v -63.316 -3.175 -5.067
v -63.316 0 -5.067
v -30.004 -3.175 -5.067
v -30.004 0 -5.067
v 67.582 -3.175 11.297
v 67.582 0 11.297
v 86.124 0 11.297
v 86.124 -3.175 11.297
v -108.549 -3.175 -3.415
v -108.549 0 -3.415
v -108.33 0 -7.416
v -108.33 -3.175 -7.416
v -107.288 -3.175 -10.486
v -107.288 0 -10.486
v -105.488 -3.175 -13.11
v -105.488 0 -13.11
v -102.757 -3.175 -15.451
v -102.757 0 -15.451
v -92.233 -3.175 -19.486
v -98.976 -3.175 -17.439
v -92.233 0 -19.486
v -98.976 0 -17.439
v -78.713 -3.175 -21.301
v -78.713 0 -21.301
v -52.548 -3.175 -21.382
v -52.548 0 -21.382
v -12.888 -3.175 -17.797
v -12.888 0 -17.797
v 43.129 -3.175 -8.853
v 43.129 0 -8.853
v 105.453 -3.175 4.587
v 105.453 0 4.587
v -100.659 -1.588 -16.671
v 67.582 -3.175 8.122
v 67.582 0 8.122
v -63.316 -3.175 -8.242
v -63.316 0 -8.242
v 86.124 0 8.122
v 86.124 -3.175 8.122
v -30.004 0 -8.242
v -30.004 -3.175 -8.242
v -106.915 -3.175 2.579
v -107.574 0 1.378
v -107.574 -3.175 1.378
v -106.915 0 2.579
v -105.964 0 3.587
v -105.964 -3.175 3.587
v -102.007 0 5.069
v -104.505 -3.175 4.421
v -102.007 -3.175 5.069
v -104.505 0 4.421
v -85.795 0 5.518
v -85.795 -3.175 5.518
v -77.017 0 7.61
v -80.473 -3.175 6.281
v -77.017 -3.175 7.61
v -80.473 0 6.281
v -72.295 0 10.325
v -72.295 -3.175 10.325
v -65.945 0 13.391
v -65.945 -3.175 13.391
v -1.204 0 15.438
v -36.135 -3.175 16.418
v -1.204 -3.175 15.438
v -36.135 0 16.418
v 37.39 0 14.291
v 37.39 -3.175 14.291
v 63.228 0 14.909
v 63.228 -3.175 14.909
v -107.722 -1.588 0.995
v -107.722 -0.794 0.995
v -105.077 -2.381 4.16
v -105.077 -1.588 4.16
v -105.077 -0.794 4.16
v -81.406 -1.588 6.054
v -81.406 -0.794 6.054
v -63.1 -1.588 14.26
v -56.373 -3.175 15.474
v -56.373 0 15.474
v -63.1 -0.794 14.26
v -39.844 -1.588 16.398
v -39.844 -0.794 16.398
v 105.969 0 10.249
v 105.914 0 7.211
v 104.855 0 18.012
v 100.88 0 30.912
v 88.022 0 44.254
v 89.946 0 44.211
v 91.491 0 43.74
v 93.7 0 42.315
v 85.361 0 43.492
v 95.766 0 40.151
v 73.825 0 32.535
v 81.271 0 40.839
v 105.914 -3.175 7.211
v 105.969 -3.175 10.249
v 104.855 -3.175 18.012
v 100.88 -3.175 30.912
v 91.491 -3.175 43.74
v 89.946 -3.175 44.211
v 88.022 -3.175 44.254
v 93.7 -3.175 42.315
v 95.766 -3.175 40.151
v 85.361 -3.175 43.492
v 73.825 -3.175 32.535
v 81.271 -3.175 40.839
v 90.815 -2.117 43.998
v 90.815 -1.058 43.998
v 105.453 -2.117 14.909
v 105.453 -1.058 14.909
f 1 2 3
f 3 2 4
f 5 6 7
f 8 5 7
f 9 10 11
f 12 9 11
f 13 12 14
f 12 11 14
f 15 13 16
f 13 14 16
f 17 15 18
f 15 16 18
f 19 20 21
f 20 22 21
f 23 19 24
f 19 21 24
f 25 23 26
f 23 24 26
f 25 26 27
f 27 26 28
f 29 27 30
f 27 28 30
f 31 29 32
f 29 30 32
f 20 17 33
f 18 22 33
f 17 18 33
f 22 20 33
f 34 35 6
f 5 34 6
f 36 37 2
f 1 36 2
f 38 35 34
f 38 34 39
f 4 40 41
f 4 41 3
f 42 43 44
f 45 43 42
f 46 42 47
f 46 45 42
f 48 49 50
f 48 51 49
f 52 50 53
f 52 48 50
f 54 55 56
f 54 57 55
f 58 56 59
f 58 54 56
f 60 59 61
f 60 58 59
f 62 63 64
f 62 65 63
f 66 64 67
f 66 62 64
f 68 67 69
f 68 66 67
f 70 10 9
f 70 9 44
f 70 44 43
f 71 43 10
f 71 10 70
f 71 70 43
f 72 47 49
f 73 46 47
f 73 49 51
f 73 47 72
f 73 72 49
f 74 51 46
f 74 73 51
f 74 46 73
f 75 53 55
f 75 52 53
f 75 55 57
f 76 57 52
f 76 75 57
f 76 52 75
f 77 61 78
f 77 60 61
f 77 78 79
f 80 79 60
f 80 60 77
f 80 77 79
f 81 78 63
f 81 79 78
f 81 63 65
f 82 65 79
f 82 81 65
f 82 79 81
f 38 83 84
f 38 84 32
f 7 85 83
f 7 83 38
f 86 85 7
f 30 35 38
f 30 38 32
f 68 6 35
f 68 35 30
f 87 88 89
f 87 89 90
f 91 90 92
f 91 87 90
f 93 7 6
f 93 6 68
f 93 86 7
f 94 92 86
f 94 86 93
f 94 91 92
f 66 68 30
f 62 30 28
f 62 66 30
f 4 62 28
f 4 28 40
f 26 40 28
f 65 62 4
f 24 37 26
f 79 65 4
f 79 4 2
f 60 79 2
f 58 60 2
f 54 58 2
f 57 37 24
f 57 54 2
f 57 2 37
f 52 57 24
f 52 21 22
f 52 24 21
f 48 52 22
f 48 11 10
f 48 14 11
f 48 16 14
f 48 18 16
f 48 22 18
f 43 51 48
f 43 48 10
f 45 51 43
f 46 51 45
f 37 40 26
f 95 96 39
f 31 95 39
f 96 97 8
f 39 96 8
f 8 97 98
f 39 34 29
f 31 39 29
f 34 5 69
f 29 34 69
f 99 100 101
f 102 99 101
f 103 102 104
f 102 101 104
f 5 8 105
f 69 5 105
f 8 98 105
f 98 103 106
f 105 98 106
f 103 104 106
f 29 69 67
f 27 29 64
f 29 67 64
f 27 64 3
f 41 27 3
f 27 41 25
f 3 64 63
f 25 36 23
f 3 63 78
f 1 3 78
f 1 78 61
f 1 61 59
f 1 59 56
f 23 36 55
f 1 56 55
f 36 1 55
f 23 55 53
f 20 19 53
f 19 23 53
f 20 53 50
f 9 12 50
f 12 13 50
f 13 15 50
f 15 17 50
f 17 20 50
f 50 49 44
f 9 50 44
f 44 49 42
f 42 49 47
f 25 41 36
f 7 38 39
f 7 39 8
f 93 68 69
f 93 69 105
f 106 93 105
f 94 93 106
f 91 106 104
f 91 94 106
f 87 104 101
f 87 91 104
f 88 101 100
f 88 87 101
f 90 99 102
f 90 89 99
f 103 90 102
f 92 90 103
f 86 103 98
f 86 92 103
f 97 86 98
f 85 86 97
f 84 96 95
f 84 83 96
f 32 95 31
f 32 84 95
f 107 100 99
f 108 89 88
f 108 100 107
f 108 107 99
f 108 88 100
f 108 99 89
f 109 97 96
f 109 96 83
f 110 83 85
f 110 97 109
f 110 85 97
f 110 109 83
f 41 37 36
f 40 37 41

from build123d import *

# Parameters (mm, degrees)
F0_W     = 33.3120238
F0_H     = 3.175
F0_W_2   = 18.542
F1_DEPTH = 3.175


with BuildPart() as f1:
    # F0 (on Front) → F1 (new body)
    with BuildSketch(Plane.XZ):
        with BuildLine():
            add(Edge.make_bspline(
                [(-108.549259603, -3.4148609266), (-108.182279592, -0.3129514374), (-107.3373402217, 7.831968629), (-77.7825654855, 2.592633478), (-65.1573496228, 23.2134765019), (20.8722034308, 12.0644123058), (63.2278099656, 14.9091919884)],
                knots=[0, 0, 0, 0, 0.1229486758, 0.3305064109, 0.5212767918, 1, 1, 1, 1], degree=3))
            add(Edge.make_bspline(
                [(-108.549259603, -3.4148609266), (-108.9023058999, -8.5028058583), (-100.6330244933, -31.3974796903), (9.8771099191, -18.4392771407), (105.4534614086, 4.587367177)],
                knots=[0, 0, 0, 0, 0.2143663155, 1, 1, 1, 1], degree=3))
            add(Edge.make_bspline(
                [(63.2278099656, 14.9091919884), (71.6076268293, 31.239608401), (92.2272859917, 60.5925255068), (106.9795582085, 14.8031922001), (105.9860341662, 6.5740305791), (105.4534614086, 4.587367177)],
                knots=[0, 0, 0, 0, 0.4151661668, 0.7893404456, 1, 1, 1, 1], degree=3))
        make_face()
        with Locations((-46.6603705677, -6.6544542596)):
            Rectangle(F0_W, F0_H, mode=Mode.SUBTRACT)
        with Locations((76.8534777889, 9.7095776774)):
            Rectangle(F0_W_2, F0_H, mode=Mode.SUBTRACT)
    extrude(amount=F1_DEPTH)


solid = f1.part
